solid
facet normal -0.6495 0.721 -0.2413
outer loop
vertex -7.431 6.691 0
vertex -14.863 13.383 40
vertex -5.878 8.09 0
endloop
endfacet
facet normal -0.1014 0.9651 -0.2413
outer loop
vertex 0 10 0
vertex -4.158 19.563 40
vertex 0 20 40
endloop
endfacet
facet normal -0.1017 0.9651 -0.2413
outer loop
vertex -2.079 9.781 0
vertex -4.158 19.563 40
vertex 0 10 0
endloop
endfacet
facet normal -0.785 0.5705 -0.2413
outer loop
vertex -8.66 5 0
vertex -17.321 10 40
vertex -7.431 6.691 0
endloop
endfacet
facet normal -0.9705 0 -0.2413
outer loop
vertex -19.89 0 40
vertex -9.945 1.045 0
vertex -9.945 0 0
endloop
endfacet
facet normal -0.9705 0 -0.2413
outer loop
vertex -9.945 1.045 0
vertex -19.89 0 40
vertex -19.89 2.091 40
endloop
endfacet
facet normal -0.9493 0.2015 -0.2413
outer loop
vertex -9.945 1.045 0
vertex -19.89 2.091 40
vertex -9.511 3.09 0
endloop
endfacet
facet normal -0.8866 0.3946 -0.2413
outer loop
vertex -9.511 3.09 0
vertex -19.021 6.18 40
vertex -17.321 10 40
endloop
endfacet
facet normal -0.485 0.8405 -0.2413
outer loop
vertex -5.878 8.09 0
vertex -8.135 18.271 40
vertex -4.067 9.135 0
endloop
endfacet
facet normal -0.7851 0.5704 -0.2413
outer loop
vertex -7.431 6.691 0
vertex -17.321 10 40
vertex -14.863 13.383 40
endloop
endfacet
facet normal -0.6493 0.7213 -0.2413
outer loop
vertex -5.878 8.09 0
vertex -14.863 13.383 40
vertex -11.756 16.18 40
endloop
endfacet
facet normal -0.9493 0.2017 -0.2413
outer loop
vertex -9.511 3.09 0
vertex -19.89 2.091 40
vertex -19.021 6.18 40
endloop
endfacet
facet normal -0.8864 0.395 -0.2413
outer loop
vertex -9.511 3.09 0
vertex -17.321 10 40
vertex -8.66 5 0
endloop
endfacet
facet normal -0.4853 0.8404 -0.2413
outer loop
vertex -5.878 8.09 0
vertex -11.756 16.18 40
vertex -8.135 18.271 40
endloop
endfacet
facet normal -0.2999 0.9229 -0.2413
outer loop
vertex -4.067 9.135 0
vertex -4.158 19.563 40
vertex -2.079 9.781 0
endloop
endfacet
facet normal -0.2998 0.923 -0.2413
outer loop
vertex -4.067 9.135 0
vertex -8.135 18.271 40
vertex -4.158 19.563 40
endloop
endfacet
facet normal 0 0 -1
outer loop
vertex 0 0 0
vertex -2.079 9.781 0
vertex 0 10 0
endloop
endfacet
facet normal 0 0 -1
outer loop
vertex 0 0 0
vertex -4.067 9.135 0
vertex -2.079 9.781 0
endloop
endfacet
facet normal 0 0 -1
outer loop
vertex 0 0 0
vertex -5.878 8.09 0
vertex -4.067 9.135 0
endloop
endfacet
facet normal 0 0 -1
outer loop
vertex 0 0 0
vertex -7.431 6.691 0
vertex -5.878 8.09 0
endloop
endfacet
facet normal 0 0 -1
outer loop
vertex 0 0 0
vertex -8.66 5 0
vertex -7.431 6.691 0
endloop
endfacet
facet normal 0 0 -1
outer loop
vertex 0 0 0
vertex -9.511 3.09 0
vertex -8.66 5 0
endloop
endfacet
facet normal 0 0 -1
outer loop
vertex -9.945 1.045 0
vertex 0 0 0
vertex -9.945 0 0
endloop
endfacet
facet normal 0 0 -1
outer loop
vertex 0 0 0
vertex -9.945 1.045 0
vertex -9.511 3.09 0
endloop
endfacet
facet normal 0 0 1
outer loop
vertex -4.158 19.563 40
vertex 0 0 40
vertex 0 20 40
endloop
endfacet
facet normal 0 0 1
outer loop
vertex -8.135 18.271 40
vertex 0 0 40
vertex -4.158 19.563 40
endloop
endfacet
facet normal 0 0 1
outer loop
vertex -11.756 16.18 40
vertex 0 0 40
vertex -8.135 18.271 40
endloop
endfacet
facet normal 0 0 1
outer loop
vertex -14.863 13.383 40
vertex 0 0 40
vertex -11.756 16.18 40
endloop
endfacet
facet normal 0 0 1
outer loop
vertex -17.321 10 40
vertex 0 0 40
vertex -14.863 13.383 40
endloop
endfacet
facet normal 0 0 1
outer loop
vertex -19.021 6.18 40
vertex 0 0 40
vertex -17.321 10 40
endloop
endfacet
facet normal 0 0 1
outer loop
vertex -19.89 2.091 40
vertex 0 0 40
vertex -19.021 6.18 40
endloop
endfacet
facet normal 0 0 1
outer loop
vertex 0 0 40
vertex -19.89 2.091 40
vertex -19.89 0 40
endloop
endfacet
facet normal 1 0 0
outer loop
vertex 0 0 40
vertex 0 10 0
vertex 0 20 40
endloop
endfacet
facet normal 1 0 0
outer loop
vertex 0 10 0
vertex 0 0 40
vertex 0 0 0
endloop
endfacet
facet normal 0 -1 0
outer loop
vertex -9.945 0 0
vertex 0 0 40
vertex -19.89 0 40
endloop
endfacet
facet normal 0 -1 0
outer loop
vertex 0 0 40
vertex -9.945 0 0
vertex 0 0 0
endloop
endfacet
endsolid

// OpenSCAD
// Toothbrush head holder in SCAD format












////////////////////////////////////////////////////////////
// Helper functions
// Obs, will only slice 0-180 degrees
// Start and end angles are relative to X axis
module cylinder_half_slice( r1, r2, h, start_angle, end_angle ) {
    module cut_cube() {
        rotate([0,0,-90]) {
            translate([0,-( r1 + r2 ),-h]) {
                cube([ 2* ( r1 + r2 ), 2*( r1 + r2 ), 3 * h ]);
            }
        }
    }

    // Rotate into place
    rotate([0,0,-(180-end_angle)]) {
        // Cut to limit of angles. 
        difference() {
            rotate([0,0,180-(end_angle-start_angle)]) {
                // First cut, limits to 180 degrees
                difference() {
                    cylinder( r1 = r1, r2 = r2, h = h );
                    cut_cube();
                }
            }
            cut_cube();
        }
    }
}


cylinder_half_slice( 10, 20, 40, 90, 180 );
